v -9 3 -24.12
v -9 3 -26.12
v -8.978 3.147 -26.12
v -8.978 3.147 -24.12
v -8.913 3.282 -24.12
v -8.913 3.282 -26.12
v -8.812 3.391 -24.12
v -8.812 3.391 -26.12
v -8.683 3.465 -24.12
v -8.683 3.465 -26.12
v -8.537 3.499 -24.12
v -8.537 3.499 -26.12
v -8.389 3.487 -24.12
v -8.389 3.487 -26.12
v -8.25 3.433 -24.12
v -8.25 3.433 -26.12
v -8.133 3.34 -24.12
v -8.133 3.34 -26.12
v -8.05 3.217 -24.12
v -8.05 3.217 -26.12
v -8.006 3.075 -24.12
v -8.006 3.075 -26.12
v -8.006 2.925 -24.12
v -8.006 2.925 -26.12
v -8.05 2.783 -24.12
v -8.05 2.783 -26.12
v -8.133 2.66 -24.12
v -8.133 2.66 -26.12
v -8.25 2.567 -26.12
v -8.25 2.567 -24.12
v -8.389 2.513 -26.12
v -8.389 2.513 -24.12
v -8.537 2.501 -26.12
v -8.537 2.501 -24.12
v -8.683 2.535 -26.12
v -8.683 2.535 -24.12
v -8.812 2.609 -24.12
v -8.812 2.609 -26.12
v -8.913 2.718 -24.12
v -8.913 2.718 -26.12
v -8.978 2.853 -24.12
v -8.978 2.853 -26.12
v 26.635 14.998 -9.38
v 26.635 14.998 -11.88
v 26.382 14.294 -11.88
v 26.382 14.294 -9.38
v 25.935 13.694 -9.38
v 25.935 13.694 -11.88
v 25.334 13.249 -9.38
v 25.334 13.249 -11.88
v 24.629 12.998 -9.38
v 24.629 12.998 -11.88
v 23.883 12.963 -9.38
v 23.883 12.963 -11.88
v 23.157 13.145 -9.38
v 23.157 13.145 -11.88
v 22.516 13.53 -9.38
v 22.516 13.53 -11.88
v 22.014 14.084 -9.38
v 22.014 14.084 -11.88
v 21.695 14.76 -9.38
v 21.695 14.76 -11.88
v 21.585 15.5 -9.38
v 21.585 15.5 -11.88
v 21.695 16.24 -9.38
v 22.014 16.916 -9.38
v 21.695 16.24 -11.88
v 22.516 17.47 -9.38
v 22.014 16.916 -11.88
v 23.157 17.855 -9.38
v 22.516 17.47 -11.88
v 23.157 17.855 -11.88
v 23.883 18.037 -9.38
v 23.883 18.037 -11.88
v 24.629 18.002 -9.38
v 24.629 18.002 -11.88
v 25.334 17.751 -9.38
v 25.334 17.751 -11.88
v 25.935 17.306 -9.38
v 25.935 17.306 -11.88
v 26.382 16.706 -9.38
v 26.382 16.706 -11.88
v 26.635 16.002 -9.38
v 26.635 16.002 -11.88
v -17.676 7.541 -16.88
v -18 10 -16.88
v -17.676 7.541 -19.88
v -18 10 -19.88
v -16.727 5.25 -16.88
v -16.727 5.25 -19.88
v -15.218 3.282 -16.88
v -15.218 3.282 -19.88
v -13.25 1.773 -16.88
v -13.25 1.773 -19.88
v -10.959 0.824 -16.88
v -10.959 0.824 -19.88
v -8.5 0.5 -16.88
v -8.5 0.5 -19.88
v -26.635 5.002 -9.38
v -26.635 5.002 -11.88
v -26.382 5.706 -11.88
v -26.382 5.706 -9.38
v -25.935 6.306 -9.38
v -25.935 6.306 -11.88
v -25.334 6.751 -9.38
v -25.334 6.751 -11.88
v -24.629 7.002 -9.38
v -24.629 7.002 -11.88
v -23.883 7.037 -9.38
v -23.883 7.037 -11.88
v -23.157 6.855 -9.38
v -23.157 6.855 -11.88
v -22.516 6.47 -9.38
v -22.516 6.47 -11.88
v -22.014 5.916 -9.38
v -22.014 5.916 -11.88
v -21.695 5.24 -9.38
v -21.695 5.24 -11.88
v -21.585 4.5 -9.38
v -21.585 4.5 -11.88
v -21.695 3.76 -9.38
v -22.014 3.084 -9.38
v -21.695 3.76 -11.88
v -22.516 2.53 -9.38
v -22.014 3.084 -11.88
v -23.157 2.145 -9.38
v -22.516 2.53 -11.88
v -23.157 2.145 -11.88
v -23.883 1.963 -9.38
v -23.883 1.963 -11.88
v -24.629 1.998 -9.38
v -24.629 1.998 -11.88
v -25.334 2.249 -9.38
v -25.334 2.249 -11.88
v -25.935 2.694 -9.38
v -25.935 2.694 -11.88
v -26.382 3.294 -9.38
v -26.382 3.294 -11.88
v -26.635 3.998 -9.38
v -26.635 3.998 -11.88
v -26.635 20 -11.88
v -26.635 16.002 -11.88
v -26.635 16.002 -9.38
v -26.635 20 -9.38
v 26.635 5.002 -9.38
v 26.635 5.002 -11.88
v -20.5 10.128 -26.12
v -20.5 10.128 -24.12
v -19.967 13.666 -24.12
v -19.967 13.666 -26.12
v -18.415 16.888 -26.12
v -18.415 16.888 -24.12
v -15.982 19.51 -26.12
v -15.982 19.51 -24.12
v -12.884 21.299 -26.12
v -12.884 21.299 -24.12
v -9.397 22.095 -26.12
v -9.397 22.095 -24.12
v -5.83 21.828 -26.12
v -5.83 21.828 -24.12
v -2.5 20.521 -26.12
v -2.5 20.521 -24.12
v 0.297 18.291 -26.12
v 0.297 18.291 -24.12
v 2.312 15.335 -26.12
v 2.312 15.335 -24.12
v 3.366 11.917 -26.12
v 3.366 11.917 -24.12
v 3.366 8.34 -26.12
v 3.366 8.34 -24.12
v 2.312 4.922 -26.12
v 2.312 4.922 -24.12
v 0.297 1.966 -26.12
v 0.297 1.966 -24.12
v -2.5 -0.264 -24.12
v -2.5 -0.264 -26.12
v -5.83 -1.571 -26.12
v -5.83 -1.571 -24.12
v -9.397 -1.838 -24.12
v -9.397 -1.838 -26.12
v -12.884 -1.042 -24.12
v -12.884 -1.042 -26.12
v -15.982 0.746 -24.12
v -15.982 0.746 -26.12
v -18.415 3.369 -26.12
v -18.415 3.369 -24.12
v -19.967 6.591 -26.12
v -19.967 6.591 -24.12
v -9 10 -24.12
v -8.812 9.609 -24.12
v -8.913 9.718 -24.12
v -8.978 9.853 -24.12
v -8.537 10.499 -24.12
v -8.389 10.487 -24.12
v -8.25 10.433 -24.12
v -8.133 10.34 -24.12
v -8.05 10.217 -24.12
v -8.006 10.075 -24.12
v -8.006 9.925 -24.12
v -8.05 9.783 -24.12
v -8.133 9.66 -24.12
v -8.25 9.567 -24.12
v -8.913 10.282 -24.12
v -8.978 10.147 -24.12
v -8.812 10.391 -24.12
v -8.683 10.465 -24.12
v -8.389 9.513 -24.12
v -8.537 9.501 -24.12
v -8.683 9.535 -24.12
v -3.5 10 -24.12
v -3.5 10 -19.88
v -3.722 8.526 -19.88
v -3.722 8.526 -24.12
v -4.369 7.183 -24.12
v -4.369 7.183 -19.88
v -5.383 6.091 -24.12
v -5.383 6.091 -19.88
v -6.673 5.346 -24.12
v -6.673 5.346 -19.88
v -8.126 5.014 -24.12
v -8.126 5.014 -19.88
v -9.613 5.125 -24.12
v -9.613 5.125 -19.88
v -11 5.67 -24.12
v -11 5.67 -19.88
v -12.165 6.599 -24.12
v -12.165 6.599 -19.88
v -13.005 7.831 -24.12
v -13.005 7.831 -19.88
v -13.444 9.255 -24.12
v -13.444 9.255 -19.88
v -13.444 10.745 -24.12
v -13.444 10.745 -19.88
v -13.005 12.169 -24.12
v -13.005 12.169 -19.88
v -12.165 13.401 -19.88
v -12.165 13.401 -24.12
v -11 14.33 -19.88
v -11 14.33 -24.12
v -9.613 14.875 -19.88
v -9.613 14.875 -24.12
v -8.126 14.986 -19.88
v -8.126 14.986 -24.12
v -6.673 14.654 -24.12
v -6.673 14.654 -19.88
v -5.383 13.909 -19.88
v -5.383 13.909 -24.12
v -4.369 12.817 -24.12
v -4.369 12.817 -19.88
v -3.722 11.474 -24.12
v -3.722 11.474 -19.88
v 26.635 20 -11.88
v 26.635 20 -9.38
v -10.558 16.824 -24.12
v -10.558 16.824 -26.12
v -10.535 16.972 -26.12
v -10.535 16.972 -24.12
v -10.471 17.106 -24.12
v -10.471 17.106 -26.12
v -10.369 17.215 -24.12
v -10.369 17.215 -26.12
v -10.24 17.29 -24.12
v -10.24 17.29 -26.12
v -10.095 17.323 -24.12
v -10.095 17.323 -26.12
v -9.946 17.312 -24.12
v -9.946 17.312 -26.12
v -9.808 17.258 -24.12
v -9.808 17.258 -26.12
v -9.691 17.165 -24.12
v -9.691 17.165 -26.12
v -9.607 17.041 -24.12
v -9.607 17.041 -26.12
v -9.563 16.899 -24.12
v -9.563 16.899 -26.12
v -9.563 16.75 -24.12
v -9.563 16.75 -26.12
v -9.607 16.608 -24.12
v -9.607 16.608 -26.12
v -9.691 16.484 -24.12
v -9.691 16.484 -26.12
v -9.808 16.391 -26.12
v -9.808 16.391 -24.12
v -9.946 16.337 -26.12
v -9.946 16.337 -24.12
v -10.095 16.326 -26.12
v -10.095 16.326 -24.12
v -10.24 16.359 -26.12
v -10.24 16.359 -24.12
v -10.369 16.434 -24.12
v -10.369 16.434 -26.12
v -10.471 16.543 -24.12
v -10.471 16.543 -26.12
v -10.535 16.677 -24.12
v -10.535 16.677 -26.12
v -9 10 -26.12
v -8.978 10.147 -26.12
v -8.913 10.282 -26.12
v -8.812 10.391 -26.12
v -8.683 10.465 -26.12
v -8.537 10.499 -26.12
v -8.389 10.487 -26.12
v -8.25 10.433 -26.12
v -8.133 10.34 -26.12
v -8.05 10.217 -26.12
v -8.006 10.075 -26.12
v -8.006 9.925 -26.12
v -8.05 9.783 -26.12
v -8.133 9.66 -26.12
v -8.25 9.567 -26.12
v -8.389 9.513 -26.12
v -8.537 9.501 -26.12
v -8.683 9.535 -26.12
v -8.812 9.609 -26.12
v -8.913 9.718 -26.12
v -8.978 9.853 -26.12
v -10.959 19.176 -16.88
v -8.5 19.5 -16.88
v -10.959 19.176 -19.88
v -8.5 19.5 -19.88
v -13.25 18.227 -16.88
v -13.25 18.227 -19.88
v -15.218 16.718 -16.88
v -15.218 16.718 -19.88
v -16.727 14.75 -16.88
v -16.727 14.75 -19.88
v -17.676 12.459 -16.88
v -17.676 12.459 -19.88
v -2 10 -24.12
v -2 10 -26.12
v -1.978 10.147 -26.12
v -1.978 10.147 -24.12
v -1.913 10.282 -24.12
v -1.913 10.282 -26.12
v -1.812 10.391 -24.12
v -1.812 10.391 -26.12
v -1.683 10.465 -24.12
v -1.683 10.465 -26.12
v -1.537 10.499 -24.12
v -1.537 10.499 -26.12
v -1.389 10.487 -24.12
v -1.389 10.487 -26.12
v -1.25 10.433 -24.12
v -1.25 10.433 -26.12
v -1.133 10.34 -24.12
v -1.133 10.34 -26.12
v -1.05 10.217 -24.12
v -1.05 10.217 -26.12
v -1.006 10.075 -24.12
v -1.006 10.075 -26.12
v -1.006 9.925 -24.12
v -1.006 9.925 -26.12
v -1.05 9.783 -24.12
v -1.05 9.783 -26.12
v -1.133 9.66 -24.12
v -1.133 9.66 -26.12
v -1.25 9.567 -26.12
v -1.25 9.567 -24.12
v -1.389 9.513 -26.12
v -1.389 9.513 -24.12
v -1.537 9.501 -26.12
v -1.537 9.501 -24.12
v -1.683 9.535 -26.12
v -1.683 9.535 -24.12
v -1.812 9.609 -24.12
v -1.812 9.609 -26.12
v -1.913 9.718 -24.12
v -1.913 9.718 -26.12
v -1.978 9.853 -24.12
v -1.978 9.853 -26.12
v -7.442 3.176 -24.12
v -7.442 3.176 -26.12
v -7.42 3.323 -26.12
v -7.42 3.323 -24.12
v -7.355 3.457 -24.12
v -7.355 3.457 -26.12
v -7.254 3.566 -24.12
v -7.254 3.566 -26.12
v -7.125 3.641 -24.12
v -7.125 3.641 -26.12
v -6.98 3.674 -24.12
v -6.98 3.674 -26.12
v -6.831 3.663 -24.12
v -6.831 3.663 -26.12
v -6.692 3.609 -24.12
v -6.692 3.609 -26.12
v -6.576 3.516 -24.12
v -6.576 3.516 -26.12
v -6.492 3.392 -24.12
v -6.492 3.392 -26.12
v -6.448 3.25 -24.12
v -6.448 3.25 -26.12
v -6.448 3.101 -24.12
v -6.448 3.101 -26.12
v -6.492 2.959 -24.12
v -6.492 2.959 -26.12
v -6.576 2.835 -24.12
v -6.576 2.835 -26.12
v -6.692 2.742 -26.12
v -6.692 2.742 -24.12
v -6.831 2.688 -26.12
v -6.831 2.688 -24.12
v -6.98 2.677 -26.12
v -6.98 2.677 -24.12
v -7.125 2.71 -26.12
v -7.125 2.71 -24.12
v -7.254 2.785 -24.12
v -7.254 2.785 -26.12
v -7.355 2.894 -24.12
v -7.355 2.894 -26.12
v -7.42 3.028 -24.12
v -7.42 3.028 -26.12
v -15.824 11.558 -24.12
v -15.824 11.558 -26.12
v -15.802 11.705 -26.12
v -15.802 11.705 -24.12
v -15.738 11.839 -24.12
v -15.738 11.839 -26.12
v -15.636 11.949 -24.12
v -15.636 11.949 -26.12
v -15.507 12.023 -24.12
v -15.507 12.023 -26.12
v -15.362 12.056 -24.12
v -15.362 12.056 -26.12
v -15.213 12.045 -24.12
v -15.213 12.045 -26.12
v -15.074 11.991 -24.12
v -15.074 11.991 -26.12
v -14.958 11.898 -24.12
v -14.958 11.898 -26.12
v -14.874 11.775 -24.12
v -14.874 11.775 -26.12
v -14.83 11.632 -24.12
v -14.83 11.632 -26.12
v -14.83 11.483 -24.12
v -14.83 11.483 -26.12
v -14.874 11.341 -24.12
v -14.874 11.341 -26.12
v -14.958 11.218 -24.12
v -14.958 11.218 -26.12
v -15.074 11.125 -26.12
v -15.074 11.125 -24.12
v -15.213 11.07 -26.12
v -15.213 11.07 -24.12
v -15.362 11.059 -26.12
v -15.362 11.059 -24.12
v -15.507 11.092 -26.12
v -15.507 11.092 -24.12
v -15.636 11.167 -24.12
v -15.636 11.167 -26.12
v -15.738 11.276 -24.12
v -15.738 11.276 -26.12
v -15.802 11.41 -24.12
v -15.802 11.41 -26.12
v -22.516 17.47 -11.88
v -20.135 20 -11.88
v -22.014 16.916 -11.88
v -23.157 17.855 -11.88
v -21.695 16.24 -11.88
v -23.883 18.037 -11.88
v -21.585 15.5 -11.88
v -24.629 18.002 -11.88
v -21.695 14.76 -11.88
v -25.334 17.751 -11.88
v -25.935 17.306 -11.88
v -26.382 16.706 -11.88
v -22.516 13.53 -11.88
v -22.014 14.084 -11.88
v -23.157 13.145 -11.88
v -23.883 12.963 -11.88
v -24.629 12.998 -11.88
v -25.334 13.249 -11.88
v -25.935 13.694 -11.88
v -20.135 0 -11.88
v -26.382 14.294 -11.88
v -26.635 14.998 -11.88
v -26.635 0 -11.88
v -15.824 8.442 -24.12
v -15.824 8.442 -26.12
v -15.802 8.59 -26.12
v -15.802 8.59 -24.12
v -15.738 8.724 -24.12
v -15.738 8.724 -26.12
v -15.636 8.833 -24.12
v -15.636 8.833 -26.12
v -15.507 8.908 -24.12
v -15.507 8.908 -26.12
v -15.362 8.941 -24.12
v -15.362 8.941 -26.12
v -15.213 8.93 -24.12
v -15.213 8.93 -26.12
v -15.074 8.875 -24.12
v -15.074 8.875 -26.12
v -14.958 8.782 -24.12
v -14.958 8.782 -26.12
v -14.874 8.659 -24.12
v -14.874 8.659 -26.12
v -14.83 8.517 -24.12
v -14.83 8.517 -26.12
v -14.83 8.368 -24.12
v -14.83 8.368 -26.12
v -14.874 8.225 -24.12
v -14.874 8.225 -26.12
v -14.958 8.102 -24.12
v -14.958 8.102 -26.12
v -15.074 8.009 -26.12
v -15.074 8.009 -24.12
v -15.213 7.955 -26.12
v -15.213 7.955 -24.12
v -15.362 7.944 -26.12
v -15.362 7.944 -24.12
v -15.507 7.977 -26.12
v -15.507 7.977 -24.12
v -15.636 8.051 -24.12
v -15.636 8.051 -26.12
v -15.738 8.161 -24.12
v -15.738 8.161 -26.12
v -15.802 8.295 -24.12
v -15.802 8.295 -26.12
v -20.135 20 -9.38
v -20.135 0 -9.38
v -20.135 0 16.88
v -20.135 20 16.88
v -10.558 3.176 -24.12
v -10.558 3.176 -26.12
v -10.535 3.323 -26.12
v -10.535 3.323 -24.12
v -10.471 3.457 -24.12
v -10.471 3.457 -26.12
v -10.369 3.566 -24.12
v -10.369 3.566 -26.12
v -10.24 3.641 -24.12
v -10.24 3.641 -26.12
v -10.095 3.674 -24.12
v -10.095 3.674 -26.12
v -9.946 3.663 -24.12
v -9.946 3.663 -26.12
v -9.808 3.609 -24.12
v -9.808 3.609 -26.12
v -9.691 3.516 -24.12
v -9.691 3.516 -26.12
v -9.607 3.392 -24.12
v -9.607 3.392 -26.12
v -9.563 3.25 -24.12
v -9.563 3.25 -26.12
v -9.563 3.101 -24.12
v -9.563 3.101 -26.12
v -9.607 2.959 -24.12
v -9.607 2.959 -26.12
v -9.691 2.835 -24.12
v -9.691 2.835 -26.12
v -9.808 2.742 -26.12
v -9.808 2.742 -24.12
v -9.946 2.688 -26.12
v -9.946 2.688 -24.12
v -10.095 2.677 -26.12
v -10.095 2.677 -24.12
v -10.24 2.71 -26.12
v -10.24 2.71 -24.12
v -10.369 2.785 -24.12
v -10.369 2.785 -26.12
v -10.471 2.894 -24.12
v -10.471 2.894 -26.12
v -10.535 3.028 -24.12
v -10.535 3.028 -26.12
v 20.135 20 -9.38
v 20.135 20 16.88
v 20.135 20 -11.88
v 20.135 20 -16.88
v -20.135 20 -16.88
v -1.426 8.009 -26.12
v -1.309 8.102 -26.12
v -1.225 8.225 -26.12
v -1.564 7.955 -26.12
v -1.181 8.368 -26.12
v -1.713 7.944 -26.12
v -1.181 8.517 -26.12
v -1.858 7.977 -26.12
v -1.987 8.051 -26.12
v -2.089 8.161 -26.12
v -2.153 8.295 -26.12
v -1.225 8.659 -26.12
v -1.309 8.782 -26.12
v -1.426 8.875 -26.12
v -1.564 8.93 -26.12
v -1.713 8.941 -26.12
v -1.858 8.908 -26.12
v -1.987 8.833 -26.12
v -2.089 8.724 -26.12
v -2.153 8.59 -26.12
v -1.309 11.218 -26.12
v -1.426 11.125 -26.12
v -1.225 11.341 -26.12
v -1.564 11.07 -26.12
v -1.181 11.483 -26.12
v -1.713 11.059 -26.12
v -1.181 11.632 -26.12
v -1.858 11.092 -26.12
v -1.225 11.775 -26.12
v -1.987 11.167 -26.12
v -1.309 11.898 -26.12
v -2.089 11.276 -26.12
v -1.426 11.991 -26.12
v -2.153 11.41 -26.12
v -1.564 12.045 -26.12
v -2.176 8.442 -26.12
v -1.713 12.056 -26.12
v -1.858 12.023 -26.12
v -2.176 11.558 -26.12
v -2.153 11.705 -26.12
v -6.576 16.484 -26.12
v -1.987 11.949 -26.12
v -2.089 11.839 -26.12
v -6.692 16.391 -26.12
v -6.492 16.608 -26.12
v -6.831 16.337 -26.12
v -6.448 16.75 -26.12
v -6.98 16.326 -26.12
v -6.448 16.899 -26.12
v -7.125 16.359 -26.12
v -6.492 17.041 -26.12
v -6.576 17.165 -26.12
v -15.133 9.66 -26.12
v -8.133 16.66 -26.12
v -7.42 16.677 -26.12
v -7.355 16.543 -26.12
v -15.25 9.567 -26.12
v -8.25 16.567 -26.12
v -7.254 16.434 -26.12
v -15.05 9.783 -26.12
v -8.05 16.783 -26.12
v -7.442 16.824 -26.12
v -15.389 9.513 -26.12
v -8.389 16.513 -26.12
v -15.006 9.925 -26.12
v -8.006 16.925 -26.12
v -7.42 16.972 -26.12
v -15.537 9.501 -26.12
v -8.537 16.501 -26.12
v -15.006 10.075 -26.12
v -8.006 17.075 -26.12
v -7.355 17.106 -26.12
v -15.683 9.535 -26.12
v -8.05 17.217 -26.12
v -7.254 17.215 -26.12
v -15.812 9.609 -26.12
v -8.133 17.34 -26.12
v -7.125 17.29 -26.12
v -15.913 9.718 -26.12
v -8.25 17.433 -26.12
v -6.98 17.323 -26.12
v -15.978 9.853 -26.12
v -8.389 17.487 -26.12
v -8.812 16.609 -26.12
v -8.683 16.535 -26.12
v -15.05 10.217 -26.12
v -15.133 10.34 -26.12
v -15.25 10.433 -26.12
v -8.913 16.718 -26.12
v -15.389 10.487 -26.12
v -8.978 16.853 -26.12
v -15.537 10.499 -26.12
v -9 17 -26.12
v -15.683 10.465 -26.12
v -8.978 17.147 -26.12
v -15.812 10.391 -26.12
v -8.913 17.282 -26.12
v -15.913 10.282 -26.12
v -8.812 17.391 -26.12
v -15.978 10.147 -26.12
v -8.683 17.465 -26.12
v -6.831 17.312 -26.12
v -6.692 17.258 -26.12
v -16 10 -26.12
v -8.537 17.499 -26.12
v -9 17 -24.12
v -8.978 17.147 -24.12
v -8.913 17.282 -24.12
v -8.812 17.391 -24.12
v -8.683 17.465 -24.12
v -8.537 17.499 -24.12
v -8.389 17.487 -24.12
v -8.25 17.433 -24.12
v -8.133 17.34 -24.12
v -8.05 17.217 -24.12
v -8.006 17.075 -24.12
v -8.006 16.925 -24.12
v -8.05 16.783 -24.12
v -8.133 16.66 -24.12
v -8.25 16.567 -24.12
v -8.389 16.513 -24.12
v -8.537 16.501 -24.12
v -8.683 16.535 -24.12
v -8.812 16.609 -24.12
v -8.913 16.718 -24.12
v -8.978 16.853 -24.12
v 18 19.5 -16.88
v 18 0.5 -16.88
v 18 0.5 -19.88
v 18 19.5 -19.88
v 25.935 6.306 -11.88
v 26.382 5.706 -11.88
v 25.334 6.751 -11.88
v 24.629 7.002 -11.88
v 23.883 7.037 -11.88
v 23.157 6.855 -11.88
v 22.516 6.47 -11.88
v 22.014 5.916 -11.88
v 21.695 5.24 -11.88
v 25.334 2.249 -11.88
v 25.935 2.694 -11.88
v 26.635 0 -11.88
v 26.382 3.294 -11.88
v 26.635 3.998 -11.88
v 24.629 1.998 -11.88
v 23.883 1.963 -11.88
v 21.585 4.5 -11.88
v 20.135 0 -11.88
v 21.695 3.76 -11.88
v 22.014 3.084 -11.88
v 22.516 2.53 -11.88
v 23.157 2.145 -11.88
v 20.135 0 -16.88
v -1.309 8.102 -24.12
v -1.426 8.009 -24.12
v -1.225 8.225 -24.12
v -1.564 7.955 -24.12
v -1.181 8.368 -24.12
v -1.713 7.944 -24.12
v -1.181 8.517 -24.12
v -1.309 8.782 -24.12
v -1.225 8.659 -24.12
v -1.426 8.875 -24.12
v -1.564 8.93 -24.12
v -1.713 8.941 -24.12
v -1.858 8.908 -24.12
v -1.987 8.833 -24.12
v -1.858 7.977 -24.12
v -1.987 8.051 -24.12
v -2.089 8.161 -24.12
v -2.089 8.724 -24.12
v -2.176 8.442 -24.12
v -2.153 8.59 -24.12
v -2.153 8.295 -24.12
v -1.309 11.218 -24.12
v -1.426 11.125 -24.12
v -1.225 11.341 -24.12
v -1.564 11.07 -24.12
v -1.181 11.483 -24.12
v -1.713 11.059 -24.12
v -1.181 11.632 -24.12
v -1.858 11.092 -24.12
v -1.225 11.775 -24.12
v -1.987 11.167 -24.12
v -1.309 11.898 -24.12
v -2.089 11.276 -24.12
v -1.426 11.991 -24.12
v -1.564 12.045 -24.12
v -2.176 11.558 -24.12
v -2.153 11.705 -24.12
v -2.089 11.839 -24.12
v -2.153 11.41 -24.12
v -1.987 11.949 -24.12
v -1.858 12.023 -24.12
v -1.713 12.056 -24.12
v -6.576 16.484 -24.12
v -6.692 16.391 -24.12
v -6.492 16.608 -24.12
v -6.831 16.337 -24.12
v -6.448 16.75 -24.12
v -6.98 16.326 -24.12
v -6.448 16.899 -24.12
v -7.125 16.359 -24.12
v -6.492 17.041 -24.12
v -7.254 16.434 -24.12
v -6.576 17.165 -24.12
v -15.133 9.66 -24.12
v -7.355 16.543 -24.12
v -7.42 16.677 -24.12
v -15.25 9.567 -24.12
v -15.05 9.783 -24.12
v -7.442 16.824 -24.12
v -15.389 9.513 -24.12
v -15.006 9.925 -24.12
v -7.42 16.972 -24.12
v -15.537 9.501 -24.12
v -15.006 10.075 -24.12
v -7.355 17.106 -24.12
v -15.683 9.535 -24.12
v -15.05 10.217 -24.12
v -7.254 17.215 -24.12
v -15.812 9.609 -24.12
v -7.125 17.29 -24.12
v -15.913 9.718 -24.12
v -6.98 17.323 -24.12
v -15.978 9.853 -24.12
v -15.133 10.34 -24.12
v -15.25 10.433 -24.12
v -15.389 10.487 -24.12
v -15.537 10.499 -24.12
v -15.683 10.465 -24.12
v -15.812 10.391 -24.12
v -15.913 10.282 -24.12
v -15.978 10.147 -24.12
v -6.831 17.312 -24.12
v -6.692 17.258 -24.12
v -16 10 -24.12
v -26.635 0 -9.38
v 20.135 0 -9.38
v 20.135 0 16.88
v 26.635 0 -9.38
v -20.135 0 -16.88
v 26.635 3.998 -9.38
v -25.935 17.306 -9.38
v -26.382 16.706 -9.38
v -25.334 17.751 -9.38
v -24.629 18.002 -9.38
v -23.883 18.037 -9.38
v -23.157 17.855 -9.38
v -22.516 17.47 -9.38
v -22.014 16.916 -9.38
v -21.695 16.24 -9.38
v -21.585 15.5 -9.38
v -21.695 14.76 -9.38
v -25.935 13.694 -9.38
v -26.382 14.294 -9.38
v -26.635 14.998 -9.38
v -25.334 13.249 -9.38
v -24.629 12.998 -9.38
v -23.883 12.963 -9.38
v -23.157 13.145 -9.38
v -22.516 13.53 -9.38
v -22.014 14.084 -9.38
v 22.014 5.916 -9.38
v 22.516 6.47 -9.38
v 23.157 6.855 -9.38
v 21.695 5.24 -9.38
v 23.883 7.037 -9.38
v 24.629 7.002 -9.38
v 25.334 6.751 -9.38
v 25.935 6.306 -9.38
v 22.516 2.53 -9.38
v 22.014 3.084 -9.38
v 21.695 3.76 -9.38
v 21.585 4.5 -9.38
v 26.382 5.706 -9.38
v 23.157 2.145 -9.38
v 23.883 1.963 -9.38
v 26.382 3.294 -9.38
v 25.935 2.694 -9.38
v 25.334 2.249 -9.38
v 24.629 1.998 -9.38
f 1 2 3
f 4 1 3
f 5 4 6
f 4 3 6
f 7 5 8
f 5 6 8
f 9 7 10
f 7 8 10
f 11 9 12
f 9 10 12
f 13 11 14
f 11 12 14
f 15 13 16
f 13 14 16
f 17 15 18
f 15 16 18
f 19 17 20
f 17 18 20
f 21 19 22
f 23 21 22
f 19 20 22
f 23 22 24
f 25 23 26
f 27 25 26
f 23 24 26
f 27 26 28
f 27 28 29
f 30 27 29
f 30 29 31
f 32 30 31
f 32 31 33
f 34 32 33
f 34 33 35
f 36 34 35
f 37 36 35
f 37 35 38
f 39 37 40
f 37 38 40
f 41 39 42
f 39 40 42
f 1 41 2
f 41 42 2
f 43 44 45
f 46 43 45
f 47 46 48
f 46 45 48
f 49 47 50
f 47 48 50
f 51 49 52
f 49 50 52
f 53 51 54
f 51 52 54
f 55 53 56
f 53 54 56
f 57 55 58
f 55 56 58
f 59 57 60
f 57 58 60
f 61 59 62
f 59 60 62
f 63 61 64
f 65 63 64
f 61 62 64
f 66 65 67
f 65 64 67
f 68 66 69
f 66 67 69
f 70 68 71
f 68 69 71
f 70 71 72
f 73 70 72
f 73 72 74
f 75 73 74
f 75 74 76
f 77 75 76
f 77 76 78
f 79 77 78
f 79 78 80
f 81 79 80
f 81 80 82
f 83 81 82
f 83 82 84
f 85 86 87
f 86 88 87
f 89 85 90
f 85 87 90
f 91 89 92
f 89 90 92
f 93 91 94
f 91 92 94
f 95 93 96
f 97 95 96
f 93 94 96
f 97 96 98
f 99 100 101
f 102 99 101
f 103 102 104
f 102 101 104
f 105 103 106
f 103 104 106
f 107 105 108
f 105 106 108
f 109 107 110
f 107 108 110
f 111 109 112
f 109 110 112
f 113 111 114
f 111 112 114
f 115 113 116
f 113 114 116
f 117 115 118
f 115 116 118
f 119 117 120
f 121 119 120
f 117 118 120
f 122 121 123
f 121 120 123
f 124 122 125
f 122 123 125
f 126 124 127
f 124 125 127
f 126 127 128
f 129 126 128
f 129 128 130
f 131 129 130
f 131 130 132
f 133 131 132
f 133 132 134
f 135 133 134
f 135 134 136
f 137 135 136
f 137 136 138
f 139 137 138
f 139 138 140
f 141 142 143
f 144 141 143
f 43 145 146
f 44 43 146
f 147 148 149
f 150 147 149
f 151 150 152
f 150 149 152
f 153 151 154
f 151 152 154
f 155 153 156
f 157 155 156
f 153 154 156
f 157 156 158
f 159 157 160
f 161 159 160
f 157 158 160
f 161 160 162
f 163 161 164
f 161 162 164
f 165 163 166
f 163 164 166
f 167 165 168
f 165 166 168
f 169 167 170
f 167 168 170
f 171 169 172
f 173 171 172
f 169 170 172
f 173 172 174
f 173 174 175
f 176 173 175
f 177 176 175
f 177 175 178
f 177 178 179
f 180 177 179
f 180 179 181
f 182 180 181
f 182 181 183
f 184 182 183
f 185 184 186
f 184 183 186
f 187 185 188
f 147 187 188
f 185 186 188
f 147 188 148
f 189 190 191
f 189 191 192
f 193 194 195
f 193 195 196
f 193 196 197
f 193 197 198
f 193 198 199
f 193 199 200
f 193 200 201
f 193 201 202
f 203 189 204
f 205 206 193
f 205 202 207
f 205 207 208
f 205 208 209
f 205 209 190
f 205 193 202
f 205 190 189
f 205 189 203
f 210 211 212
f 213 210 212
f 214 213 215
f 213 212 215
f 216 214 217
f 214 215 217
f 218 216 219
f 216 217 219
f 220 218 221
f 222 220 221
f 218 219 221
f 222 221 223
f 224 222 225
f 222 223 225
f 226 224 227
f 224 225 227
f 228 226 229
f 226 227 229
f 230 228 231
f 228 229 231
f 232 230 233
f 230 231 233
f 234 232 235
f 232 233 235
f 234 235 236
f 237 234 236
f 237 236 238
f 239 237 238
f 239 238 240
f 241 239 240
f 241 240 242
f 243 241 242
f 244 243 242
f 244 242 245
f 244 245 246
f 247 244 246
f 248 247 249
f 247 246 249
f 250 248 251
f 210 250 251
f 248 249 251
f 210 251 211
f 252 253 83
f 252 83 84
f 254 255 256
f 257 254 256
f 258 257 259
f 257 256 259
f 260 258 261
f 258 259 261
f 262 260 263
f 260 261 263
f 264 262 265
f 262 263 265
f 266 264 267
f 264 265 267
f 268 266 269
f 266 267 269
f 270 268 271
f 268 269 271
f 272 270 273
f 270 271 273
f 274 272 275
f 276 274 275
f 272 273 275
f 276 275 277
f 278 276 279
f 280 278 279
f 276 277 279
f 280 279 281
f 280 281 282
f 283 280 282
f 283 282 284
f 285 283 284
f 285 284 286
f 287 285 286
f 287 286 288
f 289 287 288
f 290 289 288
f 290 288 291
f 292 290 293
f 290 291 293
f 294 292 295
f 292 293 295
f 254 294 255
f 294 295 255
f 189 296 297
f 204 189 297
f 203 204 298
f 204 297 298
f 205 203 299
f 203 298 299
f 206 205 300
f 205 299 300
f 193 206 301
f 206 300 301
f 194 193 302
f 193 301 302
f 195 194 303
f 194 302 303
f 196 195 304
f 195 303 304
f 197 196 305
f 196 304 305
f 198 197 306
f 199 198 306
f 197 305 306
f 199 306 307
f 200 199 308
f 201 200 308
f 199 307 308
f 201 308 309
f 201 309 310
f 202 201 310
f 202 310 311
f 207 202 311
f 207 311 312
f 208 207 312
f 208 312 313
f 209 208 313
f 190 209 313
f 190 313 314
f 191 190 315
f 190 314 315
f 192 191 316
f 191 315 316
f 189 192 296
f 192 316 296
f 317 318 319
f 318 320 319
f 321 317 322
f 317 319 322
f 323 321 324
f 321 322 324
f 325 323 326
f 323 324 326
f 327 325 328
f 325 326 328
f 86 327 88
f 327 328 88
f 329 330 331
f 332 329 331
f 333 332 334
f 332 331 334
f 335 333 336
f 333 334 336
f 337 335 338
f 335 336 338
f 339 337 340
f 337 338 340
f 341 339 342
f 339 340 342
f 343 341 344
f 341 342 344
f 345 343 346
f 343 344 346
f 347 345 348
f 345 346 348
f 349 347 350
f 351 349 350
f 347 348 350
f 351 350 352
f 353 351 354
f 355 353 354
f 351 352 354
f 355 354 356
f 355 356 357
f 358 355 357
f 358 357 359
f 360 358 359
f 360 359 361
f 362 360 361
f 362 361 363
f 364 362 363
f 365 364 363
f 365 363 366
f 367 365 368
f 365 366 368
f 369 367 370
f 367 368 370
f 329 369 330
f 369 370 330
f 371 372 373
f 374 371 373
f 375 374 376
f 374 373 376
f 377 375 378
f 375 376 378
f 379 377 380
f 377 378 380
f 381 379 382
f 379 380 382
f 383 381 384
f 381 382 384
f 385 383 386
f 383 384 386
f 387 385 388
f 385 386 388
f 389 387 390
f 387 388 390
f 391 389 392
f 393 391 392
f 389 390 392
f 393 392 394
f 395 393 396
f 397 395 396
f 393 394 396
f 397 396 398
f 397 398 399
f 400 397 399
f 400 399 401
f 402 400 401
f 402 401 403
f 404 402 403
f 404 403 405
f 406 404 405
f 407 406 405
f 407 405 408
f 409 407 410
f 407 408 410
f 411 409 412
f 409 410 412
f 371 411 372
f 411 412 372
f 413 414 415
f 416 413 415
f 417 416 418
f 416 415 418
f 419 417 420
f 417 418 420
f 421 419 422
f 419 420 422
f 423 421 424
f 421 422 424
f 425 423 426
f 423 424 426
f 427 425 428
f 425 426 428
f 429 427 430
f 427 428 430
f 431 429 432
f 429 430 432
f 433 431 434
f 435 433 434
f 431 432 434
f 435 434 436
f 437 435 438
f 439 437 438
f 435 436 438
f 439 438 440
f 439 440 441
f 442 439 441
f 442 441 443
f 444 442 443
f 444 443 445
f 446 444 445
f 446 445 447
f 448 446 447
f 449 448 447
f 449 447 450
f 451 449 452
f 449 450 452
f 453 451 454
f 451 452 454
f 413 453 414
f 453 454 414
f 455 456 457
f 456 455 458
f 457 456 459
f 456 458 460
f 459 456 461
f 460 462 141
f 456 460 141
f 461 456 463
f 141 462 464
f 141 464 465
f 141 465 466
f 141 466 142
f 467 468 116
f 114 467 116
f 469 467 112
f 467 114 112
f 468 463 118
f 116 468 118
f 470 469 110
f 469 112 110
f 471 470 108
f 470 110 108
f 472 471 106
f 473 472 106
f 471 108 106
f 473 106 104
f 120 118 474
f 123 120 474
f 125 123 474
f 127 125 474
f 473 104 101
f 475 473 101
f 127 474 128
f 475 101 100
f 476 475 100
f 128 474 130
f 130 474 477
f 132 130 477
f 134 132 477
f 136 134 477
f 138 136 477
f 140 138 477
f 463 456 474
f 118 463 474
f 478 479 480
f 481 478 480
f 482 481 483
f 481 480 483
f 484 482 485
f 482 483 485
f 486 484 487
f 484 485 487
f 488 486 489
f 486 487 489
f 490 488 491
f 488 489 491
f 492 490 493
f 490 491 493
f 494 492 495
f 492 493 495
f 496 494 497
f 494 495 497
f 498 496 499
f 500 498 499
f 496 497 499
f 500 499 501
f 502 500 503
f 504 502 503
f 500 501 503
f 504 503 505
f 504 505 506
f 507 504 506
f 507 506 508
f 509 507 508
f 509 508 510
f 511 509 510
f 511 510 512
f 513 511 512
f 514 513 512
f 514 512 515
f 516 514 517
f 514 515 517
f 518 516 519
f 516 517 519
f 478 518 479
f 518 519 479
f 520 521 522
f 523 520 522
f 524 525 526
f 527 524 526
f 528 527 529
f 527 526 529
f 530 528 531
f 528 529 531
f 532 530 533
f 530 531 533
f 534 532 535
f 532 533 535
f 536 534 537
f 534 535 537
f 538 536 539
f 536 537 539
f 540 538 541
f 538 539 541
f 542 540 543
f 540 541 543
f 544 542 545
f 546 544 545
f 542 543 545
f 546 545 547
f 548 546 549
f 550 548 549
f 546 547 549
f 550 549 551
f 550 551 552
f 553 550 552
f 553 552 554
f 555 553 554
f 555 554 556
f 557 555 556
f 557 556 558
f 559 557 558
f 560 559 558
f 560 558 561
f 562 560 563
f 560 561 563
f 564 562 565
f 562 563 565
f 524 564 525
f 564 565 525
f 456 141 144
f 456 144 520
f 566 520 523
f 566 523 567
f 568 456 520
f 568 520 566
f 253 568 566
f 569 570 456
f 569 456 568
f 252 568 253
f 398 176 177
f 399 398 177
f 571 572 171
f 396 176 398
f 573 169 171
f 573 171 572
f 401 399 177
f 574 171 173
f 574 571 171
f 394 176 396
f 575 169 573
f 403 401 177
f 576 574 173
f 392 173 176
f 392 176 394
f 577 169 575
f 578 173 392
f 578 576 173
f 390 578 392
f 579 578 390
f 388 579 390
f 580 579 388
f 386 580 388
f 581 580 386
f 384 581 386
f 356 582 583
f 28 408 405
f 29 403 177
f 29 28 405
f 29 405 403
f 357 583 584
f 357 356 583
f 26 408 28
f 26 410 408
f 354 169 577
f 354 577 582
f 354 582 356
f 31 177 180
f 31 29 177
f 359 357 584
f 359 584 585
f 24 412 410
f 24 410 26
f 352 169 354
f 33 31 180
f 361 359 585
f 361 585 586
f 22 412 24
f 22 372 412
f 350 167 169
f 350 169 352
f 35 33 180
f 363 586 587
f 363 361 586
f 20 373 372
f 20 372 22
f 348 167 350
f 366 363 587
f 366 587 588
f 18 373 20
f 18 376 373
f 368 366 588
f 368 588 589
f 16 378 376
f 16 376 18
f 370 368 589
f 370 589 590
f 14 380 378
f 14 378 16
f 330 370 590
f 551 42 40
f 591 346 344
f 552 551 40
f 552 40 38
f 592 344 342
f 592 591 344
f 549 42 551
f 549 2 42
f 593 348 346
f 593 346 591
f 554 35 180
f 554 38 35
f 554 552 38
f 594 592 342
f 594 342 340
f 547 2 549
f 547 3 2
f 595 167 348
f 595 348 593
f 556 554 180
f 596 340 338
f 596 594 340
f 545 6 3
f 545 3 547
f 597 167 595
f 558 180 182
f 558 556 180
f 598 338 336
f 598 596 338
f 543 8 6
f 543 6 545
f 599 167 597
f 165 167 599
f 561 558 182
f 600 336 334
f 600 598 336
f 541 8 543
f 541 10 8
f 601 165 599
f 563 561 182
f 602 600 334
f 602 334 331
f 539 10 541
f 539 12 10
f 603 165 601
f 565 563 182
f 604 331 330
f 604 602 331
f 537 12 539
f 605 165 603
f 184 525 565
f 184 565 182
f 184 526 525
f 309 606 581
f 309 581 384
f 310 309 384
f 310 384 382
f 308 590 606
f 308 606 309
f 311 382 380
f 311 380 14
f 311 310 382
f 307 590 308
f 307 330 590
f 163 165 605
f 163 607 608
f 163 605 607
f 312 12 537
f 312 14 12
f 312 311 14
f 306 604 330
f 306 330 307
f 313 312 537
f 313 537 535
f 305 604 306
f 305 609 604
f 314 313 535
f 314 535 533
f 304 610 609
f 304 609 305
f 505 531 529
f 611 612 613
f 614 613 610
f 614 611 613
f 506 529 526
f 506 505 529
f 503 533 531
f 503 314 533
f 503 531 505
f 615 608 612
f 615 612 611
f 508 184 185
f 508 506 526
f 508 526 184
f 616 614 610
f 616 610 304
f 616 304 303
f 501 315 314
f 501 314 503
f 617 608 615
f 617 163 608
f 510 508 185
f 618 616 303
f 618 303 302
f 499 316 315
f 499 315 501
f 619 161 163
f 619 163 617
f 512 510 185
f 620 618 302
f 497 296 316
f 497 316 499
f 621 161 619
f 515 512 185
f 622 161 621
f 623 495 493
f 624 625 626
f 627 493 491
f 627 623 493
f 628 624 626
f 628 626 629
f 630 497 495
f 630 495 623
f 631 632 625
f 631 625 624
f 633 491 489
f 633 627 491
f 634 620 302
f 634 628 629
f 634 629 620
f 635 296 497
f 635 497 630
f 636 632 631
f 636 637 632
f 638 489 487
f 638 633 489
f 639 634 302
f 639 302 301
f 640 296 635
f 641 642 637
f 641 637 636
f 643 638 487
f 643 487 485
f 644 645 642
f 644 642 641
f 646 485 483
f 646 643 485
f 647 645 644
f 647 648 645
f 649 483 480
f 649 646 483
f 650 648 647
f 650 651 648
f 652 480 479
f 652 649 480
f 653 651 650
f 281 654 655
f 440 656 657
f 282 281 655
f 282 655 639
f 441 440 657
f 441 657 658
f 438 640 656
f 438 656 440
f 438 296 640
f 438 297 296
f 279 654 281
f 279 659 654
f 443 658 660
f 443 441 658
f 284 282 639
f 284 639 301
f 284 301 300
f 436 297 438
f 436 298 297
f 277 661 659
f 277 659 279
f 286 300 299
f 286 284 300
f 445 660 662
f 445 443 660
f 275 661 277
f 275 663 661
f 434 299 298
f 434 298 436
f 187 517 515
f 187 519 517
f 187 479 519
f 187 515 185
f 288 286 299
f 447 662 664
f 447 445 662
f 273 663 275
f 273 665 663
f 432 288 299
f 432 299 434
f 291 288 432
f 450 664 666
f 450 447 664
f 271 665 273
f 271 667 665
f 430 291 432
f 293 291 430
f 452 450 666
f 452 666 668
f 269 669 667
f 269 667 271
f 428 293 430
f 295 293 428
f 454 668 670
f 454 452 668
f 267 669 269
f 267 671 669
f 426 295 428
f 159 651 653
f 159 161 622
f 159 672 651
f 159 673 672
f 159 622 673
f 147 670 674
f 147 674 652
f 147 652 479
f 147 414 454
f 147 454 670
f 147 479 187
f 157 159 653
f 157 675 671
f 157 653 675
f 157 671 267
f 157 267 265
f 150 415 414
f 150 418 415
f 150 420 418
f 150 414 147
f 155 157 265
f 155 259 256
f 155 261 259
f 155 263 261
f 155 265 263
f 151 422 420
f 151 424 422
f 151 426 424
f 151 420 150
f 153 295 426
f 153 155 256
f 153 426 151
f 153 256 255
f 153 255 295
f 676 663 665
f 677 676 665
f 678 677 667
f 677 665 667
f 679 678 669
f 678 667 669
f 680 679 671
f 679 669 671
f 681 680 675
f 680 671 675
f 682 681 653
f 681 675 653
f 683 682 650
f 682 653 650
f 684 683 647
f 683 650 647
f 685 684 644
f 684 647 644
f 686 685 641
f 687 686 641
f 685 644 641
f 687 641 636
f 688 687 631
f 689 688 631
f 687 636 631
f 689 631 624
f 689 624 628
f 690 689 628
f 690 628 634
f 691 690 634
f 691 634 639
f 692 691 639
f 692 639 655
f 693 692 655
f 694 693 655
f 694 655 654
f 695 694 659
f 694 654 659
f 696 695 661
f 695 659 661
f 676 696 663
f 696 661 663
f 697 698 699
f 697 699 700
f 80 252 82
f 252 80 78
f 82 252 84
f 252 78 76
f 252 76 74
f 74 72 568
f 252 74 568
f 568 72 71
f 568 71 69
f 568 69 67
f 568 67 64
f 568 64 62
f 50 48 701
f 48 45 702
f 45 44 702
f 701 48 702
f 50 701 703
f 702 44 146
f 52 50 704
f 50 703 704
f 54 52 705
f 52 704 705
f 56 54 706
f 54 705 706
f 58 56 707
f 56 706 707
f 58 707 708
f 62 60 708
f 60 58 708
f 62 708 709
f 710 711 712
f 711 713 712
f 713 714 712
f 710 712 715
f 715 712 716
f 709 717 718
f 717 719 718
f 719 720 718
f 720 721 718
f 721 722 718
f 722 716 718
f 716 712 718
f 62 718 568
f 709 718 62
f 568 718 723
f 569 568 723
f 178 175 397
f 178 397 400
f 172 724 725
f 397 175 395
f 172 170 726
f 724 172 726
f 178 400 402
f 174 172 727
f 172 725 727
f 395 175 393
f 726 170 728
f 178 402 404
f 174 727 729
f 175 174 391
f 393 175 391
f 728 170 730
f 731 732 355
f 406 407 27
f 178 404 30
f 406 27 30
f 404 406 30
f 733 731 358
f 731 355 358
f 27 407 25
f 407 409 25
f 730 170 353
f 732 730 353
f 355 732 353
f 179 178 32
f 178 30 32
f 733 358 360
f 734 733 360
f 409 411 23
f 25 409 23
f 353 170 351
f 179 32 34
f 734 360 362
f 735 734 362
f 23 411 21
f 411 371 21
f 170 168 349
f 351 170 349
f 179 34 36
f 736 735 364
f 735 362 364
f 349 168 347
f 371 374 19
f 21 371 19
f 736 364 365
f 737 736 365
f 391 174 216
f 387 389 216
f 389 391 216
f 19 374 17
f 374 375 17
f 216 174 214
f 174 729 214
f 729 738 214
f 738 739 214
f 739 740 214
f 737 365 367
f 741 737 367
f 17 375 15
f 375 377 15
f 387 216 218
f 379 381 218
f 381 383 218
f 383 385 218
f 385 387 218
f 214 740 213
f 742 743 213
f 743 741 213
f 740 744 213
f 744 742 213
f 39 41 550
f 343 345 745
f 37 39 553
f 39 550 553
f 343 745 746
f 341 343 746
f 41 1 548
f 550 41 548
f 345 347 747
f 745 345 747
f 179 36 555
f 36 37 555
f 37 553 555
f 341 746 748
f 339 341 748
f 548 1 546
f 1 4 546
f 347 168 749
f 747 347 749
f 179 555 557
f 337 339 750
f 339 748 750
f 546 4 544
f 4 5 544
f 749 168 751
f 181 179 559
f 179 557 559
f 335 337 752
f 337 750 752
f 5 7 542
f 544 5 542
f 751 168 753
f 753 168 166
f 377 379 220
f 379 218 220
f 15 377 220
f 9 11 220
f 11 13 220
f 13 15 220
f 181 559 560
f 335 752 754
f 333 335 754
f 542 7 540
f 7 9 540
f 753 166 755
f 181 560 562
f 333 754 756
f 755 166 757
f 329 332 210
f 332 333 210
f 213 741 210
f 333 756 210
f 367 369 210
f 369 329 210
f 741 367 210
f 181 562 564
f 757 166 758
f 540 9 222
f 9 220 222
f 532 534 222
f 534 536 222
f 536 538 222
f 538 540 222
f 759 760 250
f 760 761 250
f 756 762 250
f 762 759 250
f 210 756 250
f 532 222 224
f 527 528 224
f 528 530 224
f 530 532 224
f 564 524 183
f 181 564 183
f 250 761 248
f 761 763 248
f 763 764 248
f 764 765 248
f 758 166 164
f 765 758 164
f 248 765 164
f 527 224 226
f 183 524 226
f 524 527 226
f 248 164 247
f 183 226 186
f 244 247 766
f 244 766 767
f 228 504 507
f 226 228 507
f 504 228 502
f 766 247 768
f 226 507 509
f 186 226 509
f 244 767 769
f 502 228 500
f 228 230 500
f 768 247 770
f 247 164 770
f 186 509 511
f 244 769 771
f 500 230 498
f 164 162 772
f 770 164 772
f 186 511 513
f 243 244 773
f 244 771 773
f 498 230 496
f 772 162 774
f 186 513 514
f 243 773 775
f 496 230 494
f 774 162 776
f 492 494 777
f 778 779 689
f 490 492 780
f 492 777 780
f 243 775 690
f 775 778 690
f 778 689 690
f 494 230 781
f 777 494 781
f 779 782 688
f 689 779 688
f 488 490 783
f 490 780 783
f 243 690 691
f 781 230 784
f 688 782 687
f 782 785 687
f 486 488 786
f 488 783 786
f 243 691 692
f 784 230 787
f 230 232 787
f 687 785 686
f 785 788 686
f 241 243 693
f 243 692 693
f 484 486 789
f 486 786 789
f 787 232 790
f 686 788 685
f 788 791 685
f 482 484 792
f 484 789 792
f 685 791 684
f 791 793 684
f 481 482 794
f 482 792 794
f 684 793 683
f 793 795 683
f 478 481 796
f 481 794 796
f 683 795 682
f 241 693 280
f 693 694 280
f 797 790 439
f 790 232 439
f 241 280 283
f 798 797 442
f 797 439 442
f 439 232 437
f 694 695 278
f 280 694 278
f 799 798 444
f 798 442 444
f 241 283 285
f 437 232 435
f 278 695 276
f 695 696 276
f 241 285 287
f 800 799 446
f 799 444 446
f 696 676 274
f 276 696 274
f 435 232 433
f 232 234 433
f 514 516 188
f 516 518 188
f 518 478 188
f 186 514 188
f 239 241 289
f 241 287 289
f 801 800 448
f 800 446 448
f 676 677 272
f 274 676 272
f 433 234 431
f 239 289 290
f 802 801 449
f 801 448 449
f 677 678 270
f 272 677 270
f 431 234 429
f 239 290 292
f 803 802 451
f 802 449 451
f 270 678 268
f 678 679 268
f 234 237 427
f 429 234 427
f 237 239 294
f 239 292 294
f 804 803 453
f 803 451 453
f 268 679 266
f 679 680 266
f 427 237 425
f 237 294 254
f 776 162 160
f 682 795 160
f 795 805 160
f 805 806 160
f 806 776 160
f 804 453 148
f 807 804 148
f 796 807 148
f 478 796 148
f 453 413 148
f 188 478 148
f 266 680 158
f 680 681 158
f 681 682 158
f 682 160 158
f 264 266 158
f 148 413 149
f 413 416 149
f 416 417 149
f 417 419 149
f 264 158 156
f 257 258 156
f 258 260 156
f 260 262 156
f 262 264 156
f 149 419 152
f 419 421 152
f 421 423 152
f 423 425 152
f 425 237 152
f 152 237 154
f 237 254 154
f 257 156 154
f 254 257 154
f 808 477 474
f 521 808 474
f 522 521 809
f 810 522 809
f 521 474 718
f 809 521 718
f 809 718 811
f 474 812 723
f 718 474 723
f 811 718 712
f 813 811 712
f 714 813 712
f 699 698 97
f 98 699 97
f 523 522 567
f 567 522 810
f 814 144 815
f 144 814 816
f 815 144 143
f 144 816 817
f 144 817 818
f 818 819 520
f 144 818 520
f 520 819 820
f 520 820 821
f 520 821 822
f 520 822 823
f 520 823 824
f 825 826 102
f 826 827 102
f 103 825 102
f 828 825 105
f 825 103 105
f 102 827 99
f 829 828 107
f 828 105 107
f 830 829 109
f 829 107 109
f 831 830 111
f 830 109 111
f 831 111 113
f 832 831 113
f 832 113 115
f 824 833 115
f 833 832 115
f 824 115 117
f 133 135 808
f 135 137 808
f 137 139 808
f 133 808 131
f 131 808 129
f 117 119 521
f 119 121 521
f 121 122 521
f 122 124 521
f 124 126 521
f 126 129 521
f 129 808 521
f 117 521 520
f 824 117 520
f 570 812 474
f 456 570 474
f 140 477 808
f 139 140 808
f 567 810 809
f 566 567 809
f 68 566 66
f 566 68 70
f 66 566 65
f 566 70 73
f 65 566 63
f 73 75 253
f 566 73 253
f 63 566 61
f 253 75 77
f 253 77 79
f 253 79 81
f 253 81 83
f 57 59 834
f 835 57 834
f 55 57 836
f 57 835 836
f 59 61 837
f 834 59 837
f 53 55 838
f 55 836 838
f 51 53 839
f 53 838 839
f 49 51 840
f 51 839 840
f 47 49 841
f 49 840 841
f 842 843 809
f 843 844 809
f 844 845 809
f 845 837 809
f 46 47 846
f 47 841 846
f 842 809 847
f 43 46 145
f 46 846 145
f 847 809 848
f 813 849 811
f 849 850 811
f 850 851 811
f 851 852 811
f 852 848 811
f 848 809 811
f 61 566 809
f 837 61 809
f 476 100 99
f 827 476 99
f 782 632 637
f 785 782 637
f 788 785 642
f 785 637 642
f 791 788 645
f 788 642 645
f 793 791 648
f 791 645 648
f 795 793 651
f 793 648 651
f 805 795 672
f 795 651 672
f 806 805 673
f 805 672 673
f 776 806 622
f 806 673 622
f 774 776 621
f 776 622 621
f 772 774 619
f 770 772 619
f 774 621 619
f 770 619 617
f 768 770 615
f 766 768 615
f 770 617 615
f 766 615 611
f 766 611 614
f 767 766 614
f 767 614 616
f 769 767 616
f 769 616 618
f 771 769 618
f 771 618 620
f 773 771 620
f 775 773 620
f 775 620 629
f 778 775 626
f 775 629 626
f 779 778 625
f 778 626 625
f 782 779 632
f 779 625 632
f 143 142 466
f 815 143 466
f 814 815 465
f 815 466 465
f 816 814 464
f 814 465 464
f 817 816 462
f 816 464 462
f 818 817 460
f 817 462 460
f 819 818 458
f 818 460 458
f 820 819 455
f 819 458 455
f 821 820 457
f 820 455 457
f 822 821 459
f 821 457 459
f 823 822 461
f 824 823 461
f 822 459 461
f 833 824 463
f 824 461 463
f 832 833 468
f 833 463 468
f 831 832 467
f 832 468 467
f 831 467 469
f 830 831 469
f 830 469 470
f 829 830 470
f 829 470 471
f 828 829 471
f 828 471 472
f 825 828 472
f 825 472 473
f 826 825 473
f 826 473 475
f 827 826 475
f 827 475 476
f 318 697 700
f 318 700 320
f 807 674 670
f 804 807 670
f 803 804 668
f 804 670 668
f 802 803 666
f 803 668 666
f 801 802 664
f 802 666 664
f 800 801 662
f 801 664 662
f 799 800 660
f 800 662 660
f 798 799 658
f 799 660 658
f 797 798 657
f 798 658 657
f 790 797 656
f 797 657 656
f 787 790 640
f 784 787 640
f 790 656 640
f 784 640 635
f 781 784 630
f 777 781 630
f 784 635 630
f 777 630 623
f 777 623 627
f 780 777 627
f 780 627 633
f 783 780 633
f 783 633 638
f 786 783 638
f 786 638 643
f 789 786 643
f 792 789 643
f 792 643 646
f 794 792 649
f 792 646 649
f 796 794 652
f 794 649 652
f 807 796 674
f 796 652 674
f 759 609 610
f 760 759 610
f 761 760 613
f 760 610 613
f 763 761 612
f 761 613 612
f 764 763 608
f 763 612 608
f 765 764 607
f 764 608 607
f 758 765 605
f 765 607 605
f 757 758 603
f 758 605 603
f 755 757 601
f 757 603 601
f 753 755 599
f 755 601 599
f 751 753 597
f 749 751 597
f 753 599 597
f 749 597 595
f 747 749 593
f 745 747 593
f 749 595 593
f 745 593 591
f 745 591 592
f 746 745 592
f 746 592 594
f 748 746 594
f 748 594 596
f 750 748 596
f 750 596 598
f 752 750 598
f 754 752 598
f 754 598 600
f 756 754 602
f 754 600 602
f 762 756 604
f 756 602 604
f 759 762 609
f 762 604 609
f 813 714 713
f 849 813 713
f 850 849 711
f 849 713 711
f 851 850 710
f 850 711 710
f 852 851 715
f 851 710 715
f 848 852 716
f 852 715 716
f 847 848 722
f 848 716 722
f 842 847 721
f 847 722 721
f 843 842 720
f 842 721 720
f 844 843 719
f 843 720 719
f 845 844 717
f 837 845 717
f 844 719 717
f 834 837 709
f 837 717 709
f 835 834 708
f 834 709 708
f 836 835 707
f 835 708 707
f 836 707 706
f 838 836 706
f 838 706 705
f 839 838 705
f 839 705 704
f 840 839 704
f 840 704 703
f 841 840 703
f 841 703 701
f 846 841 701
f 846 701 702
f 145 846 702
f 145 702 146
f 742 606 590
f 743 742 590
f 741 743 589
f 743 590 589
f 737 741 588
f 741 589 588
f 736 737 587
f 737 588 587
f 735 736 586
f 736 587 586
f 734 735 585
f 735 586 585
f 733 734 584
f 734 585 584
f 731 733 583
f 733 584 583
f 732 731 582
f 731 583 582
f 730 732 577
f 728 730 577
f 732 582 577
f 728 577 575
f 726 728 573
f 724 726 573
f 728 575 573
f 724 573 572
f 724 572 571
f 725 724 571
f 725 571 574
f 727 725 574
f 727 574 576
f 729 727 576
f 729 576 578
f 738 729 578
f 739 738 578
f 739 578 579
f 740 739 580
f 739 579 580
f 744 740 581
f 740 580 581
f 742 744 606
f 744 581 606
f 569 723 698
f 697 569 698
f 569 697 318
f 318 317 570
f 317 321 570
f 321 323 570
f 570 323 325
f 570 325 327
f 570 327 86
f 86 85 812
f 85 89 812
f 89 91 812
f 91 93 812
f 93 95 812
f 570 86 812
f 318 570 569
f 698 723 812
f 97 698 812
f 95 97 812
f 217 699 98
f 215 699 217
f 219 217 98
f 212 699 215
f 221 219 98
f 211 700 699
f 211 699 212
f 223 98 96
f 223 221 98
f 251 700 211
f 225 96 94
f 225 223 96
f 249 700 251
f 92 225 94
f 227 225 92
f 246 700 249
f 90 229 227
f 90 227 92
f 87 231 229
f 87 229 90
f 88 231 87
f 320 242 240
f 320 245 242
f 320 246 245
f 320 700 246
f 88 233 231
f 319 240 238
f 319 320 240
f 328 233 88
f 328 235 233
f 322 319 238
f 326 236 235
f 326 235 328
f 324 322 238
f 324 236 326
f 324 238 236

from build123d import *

# Parameters (mm, degrees)
BOSS_EXTRUDE1_DEPTH = 20
SKETCH3_W           = 36
SKETCH3_H           = 19
BOSS_EXTRUDE2_DEPTH = 3
FILLET3_R           = 9.5
FILLET4_R           = 9.5
SKETCH4_R           = 5
BOSS_EXTRUDE3_DEPTH = 4.24
SKETCH5_R           = 12
BOSS_EXTRUDE4_DEPTH = 2
SKETCH6_R           = 2.55
CUT_EXTRUDE4_DEPTH  = 46.01365694
SKETCH8_R           = 0.5
CUT_EXTRUDE5_DEPTH  = 2


with BuildPart() as part:
    # Sketch1 → Boss-Extrude1 (new body)
    with BuildSketch(Plane(origin=(0, 0, 0), x_dir=(1, 0, 0), z_dir=(0, 1, 0))):
        Polygon((20.135, 9.38), (26.635, 9.38), (26.635, 11.88), (20.135, 11.88), (20.135, 16.88), (-20.135, 16.88), (-20.135, 11.88), (-26.635, 11.88), (-26.635, 9.38), (-20.135, 9.38), (-20.135, -16.88), (20.135, -16.88), align=None)
    extrude(amount=BOSS_EXTRUDE1_DEPTH)

    # Sketch3 → Boss-Extrude2 (add)
    with BuildSketch(Plane(origin=(0, 0, -16.88), x_dir=(-1, 0, 0), z_dir=(0, 0, -1))):
        with Locations((0, 10)):
            Rectangle(SKETCH3_W, SKETCH3_H)
    extrude(amount=BOSS_EXTRUDE2_DEPTH)

    # Fillet3
    fillet3_edges = [part.edges().sort_by_distance(p)[0] for p in [
        (-18, 19.5, -18.38),
    ]]
    fillet(fillet3_edges, radius=FILLET3_R)

    # Fillet4
    fillet4_edges = [part.edges().sort_by_distance(p)[0] for p in [
        (-18, 0.5, -18.38),
    ]]
    fillet(fillet4_edges, radius=FILLET4_R - 0.0001)  # a hair under: the kernel refuses the full size

    # Sketch4 → Boss-Extrude3 (add)
    with BuildSketch(Plane(origin=(0, 0, -19.88), x_dir=(-1, 0, 0), z_dir=(0, 0, -1))):
        with Locations(Location((8.5, 10, 0), (0, 0, 180))):
            Circle(SKETCH4_R)
    extrude(amount=BOSS_EXTRUDE3_DEPTH)

    # Sketch5 → Boss-Extrude4 (add)
    with BuildSketch(Plane(origin=(0, 0, -24.12), x_dir=(-1, 0, 0), z_dir=(0, 0, -1))):
        with Locations((8.5, 10.128454218)):
            Circle(SKETCH5_R)
    extrude(amount=BOSS_EXTRUDE4_DEPTH)

    # Sketch6 → Cut-Extrude4 (cut, through all)
    with BuildSketch(Plane(origin=(0, 0, -11.88), x_dir=(-1, 0, 0), z_dir=(0, 0, -1))):
        with Locations((-24.135, 15.5)):
            Circle(SKETCH6_R)
        with Locations((-24.135, 4.5)):
            Circle(SKETCH6_R)
        with Locations((24.135, 15.5)):
            Circle(SKETCH6_R)
        with Locations((24.135, 4.5)):
            Circle(SKETCH6_R)
    extrude(amount=-CUT_EXTRUDE4_DEPTH, mode=Mode.SUBTRACT)

    # Sketch8 → Cut-Extrude5 (cut)
    with BuildSketch(Plane(origin=(0, 0, -26.12), x_dir=(-1, 0, 0), z_dir=(0, 0, -1))):
        with Locations((8.5, 10)):
            Circle(SKETCH8_R)
        with Locations((1.675504615, 11.557646538)):
            Circle(SKETCH8_R)
        with Locations((1.5, 10)):
            Circle(SKETCH8_R)
        with Locations((6.942353462, 16.824495385)):
            Circle(SKETCH8_R)
        with Locations((8.5, 17)):
            Circle(SKETCH8_R)
        with Locations((10.057646538, 16.824495385)):
            Circle(SKETCH8_R)
        with Locations((15.324495385, 11.557646538)):
            Circle(SKETCH8_R)
        with Locations((15.5, 10)):
            Circle(SKETCH8_R)
        with Locations((15.324495385, 8.442353462)):
            Circle(SKETCH8_R)
        with Locations((10.057646538, 3.175504615)):
            Circle(SKETCH8_R)
        with Locations((8.5, 3)):
            Circle(SKETCH8_R)
        with Locations((6.942353462, 3.175504615)):
            Circle(SKETCH8_R)
        with Locations((1.675504615, 8.442353462)):
            Circle(SKETCH8_R)
    extrude(amount=-CUT_EXTRUDE5_DEPTH, mode=Mode.SUBTRACT)


solid = part.part
